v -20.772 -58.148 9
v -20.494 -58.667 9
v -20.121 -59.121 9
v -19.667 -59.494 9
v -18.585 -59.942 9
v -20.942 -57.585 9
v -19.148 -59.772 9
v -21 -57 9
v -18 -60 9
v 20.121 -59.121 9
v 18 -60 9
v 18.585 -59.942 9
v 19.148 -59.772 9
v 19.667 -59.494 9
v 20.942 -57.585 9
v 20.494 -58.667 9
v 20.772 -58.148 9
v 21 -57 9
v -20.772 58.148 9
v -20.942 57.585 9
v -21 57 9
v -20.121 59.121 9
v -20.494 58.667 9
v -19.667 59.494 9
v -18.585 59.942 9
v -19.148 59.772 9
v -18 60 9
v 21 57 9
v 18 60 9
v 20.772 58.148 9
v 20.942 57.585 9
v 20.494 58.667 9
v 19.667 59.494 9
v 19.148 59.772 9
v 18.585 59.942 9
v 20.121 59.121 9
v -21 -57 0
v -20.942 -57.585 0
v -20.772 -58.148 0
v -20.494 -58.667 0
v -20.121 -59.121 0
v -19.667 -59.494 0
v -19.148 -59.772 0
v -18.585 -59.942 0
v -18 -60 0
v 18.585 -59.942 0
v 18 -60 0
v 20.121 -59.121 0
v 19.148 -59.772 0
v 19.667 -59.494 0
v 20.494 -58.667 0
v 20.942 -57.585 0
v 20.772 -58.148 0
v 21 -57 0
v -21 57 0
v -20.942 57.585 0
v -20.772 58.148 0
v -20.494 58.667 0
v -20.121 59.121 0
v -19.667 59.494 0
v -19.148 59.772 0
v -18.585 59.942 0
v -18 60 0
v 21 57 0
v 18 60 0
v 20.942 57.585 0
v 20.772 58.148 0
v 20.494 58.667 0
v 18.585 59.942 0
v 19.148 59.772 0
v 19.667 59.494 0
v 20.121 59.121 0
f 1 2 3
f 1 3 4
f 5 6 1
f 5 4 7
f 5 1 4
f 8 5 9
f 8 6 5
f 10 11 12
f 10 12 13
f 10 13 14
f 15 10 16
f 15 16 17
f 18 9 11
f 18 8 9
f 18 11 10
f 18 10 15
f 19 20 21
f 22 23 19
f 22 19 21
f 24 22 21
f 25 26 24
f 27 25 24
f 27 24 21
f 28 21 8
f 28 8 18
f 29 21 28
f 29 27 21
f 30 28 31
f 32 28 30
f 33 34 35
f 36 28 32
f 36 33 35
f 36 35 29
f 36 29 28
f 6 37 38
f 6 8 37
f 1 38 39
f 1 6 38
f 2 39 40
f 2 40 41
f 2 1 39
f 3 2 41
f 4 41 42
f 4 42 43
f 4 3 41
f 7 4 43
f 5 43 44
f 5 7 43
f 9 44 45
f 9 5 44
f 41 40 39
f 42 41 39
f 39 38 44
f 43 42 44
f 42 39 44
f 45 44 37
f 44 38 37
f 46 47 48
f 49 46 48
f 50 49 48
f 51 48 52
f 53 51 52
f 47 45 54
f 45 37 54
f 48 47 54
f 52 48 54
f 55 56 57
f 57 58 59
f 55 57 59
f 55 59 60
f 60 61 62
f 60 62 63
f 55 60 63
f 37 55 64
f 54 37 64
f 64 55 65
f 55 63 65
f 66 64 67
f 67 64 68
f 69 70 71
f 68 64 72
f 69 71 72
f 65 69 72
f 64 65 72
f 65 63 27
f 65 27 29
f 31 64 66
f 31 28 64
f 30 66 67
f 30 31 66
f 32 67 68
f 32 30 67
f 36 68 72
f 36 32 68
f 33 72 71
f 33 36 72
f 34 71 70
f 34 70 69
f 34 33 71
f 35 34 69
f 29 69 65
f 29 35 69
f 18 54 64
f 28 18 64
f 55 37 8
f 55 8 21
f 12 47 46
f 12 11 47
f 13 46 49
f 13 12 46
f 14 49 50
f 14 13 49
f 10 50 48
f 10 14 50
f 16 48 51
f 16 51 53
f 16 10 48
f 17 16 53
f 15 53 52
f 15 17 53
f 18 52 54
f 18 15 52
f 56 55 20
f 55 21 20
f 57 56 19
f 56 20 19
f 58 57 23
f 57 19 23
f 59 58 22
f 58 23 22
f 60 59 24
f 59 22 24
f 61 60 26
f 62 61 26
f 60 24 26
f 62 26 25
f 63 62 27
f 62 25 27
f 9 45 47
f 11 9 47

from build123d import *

# Parameters (mm, degrees)
ESQUISSE1_W        = 42
ESQUISSE1_H        = 120
BOSS_EXTRU_1_DEPTH = 9
CONG_1_R           = 3


with BuildPart() as part:
    # Esquisse1 → Boss.-Extru.1 (new body)
    with BuildSketch(Plane.XY):
        Rectangle(ESQUISSE1_W, ESQUISSE1_H)
    extrude(amount=BOSS_EXTRU_1_DEPTH)

    # Congé1
    cong_1_edges = [part.edges().sort_by_distance(p)[0] for p in [
        (-21, 60, 4.5),
        (21, 60, 4.5),
        (21, -60, 4.5),
        (-21, -60, 4.5),
    ]]
    fillet(cong_1_edges, radius=CONG_1_R)


solid = part.part
